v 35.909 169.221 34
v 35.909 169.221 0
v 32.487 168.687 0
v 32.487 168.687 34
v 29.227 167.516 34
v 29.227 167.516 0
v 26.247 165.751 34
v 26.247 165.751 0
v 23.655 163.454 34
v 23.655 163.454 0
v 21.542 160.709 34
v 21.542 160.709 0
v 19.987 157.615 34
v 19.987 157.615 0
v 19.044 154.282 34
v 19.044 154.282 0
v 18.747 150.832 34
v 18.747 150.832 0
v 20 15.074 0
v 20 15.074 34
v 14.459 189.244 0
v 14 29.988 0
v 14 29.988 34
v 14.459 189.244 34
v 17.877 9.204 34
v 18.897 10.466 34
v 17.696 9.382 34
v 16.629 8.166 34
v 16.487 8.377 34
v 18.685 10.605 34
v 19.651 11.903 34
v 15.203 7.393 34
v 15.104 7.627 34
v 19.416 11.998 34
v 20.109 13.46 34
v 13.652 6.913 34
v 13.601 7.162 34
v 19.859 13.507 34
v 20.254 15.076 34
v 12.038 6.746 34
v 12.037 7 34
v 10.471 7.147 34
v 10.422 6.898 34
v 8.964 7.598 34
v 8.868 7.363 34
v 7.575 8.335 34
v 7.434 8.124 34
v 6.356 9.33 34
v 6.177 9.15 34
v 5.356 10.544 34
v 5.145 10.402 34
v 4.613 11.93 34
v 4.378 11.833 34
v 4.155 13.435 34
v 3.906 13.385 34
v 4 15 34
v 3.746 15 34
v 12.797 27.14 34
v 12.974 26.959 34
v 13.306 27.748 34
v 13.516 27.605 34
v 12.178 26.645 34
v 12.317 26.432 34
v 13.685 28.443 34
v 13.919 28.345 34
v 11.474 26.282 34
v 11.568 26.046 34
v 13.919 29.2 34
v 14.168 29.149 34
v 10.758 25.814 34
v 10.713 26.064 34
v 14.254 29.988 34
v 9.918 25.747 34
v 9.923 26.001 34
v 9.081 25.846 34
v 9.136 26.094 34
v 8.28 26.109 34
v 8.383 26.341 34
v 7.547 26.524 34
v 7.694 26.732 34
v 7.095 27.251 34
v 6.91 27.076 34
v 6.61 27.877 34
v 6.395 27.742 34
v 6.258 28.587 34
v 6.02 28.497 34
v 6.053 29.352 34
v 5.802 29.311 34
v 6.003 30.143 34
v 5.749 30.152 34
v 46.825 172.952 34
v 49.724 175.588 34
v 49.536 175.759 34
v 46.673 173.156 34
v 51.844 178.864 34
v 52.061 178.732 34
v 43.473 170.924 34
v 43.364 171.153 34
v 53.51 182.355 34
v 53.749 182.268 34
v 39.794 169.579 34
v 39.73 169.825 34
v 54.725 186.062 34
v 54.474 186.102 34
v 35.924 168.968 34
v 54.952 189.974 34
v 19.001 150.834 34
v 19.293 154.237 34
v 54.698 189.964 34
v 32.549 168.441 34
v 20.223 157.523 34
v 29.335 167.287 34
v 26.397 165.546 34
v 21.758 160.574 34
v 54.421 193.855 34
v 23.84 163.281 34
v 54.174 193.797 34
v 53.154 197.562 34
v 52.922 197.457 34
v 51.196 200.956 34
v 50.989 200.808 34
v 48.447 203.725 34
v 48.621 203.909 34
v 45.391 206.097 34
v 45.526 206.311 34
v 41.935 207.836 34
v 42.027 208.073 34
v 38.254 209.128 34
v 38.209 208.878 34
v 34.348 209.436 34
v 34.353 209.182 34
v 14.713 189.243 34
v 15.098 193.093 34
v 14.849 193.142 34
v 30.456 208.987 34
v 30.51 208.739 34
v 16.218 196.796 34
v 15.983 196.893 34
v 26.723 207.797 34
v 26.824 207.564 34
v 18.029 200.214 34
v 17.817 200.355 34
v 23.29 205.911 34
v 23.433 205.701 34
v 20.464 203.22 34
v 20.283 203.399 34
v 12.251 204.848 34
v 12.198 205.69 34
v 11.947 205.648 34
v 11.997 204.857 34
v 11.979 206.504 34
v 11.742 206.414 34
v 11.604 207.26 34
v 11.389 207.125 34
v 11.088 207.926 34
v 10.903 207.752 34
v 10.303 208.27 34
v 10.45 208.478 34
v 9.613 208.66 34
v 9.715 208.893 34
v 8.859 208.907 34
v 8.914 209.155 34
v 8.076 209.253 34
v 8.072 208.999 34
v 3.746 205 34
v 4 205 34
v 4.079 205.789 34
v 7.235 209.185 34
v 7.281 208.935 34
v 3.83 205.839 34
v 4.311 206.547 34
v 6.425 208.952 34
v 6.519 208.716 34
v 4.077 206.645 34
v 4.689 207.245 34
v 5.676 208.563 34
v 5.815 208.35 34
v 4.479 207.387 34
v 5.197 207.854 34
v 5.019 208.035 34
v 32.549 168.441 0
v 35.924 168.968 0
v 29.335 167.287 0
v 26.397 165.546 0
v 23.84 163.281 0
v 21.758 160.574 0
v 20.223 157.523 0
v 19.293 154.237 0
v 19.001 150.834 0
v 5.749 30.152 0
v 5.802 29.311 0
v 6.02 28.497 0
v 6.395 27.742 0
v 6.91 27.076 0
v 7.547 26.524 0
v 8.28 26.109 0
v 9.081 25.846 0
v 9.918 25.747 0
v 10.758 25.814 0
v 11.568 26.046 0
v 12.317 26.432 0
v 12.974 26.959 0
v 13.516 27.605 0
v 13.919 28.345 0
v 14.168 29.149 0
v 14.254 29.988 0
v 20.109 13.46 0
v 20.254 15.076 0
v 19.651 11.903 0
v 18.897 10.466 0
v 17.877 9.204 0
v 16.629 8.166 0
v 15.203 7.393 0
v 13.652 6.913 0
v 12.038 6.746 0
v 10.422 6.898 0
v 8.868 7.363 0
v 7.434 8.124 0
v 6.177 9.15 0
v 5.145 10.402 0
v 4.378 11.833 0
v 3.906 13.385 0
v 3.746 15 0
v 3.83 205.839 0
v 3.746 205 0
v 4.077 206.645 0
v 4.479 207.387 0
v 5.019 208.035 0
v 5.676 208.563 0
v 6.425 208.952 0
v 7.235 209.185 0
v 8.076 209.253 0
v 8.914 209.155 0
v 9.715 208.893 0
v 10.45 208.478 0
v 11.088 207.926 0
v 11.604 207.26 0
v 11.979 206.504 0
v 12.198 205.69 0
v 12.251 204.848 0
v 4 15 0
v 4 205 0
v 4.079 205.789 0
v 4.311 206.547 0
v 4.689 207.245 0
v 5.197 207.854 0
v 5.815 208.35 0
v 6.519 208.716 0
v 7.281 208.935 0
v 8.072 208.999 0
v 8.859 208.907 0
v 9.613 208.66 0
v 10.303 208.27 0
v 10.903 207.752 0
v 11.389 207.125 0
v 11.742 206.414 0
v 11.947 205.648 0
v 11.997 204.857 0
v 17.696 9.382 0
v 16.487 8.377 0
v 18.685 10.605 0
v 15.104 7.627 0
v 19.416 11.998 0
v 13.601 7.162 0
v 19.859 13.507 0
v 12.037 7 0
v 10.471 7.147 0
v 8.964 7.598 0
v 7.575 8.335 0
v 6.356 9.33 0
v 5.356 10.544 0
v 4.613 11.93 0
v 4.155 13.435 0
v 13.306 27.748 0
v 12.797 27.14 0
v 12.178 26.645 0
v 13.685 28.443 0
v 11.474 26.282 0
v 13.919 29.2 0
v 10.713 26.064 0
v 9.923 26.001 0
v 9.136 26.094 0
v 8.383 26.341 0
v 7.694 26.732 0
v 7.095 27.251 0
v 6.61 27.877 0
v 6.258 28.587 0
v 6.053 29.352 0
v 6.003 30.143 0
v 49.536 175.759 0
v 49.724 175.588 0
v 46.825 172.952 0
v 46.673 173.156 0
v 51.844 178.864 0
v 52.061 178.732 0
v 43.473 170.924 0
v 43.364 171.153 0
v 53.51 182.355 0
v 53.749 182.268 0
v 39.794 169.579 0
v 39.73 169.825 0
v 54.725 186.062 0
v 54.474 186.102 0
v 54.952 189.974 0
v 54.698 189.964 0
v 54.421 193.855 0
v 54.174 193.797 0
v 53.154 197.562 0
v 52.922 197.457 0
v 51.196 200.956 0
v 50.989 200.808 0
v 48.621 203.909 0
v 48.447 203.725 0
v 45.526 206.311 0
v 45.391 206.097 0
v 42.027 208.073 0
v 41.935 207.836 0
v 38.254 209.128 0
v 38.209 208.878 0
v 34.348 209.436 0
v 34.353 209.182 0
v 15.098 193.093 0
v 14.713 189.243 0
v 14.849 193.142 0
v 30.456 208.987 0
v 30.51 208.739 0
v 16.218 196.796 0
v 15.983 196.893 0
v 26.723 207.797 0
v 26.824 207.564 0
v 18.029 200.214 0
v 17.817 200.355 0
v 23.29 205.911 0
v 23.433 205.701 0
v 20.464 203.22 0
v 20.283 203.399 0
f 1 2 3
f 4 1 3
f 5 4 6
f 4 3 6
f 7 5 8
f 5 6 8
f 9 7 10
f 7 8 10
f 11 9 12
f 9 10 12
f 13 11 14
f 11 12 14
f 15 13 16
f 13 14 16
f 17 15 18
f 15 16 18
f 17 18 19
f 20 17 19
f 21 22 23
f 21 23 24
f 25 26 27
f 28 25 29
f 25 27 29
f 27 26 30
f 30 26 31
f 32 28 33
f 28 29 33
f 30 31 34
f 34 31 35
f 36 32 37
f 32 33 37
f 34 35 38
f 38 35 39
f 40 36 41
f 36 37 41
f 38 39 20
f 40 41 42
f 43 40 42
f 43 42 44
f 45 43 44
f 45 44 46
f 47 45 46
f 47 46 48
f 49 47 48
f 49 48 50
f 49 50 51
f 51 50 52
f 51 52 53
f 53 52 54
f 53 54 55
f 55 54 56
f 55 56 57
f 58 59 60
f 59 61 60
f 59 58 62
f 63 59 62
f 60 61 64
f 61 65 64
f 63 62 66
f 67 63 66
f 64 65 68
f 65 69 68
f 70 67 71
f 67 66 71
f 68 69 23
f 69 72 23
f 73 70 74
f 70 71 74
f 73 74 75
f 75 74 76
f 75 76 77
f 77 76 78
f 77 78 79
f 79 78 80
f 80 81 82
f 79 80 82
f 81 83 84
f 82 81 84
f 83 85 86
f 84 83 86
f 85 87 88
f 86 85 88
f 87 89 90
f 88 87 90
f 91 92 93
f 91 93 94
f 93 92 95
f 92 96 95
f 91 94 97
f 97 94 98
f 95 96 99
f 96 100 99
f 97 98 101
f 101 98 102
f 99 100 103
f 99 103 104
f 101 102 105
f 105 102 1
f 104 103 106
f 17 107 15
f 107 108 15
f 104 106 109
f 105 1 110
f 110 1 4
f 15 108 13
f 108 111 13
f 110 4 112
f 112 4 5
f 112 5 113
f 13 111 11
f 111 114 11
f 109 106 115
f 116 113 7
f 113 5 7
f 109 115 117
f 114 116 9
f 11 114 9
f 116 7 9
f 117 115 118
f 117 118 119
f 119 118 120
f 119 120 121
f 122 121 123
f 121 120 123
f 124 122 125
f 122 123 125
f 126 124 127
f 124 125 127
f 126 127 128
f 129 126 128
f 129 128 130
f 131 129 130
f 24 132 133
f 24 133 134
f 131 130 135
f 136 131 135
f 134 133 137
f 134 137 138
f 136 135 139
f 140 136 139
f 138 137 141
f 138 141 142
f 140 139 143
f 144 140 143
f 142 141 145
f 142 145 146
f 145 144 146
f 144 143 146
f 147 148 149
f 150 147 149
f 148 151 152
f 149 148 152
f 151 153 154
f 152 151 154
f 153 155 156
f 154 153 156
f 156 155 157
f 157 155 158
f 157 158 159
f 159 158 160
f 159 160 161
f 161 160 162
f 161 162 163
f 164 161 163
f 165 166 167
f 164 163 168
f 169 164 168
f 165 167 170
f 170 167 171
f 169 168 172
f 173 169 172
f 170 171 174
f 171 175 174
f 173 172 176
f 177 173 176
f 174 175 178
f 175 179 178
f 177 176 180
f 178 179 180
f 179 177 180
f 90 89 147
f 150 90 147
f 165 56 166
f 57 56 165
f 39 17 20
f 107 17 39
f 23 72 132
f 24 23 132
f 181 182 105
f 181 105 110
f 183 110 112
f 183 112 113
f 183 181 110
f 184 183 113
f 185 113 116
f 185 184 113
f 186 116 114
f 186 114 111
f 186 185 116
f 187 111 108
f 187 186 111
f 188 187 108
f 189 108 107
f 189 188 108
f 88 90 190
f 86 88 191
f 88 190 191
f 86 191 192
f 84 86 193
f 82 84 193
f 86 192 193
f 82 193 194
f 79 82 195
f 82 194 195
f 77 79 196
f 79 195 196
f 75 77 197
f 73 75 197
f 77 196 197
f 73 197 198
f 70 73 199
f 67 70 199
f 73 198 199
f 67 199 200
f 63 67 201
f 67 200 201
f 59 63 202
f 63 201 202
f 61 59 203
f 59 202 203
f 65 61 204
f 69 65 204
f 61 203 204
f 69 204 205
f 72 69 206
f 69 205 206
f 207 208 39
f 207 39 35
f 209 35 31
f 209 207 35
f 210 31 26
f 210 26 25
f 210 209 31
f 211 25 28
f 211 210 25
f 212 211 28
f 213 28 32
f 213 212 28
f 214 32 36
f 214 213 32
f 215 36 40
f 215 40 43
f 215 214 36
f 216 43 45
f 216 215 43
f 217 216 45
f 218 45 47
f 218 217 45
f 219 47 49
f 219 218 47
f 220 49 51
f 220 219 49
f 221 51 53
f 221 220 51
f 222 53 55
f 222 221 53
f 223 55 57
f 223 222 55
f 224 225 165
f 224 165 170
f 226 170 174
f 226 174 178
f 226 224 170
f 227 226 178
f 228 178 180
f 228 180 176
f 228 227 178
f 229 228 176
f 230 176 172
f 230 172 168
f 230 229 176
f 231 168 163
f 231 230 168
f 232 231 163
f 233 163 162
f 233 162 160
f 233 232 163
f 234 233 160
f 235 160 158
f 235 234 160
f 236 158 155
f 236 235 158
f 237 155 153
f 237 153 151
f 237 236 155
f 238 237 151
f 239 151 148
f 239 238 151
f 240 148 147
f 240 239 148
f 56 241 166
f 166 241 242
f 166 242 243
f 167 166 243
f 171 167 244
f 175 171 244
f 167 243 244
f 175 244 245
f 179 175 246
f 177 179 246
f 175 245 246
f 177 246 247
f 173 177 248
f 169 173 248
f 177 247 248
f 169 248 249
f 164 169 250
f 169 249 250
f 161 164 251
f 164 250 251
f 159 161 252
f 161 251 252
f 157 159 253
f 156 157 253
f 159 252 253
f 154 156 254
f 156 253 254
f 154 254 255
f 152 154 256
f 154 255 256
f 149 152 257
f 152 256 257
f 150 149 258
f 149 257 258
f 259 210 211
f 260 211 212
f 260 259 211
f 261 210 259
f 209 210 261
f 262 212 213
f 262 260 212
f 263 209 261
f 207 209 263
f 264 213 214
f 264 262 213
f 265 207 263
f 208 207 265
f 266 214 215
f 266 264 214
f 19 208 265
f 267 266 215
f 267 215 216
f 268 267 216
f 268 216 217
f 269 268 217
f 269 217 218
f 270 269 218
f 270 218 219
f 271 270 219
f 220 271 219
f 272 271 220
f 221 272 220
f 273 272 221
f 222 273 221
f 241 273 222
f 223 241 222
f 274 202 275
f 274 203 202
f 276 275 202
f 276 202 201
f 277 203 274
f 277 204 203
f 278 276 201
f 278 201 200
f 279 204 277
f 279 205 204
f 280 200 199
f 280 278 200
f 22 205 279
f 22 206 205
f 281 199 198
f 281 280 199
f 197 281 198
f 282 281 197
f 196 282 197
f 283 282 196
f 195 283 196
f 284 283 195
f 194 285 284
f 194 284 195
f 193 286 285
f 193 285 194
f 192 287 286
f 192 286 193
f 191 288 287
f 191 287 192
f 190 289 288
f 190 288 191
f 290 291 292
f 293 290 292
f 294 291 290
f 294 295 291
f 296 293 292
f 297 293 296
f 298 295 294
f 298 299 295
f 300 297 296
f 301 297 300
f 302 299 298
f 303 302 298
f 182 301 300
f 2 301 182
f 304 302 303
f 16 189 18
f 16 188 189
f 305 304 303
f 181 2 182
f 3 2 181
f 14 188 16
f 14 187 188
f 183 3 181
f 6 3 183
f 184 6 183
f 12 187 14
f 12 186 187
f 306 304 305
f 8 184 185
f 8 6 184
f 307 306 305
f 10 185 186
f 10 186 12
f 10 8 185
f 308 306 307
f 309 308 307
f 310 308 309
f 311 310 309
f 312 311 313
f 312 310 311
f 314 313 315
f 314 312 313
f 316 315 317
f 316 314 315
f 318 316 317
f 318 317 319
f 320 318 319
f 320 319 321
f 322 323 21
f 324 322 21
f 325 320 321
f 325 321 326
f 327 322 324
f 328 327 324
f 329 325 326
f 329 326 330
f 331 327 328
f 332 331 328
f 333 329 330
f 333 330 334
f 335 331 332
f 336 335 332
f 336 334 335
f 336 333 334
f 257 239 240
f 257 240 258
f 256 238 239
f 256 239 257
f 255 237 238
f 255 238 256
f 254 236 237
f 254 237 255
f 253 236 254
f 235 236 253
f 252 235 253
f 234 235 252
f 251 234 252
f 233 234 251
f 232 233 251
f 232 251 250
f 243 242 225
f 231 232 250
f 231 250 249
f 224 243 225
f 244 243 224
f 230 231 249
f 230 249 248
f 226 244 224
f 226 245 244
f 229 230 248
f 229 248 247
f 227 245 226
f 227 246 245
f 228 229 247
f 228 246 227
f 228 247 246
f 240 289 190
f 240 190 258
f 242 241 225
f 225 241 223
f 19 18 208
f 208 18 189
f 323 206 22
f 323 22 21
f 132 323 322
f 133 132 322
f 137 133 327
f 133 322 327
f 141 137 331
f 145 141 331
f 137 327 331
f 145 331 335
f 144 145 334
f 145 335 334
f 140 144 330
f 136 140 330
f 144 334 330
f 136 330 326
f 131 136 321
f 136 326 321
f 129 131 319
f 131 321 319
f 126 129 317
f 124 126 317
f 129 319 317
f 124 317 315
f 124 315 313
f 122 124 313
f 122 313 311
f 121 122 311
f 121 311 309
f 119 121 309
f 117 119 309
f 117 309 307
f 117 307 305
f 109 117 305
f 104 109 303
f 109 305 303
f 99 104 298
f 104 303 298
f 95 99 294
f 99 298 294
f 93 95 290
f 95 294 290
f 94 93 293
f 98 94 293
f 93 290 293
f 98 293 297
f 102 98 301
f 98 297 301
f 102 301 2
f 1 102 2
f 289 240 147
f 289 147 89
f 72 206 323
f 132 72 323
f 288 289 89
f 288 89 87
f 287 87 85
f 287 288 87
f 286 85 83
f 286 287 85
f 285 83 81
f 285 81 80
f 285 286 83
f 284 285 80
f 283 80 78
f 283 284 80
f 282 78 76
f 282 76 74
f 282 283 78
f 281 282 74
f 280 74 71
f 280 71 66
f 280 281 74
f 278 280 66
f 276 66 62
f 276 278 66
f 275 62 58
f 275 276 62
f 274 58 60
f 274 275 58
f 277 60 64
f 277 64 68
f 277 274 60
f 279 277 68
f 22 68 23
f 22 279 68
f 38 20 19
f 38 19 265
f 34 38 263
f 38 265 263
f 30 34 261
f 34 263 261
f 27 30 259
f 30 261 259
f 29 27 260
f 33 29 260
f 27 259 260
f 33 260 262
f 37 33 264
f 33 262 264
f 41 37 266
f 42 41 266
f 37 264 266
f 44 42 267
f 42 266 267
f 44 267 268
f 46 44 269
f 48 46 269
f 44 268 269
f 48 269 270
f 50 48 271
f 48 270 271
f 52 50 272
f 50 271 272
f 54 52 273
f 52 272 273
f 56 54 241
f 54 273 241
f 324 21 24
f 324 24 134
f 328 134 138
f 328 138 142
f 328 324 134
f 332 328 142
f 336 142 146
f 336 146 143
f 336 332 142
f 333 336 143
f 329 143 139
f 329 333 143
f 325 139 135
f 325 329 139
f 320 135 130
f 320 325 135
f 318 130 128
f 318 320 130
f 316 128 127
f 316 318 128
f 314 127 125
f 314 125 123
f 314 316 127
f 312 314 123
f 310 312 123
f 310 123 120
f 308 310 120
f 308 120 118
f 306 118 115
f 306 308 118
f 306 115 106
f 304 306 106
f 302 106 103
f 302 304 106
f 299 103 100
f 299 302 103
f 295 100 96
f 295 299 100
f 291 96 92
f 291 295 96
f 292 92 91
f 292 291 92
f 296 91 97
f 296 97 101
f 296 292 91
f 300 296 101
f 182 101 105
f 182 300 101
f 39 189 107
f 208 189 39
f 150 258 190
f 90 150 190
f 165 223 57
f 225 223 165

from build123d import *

# Parameters (mm, degrees)
BOSS_EXTRUDE1_DEPTH = 34


with BuildPart() as part:
    # Sketch1 → Boss-Extrude1 (new body)
    with BuildSketch(Plane.XY):
        with BuildLine():
            Line((3.746, 15), (3.746, 43))
            Line((3.746, 43), (3.746, 173))
            Line((3.746, 173), (3.746, 205))
            ThreePointArc((3.746, 205), (8.076040586, 209.25332033), (12.251281537, 204.847943126))
            Line((12.251281537, 204.847943126), (6.002556148, 30.142977785))
            ThreePointArc((6.002556148, 30.142977785), (9.922734835, 26.000746308), (13.999983378, 29.988468323))
            Line((13.999983378, 29.988468323), (14.459106014, 189.24396707))
            ThreePointArc((14.459106014, 189.24396707), (48.621297679, 203.909175827), (35.923887521, 168.967804038))
            ThreePointArc((35.923887521, 168.967804038), (23.840329441, 163.281004469), (19.000766489, 150.833888513))
            Line((19.000766489, 150.833888513), (20.253648522, 15.076171345))
            ThreePointArc((20.253648522, 15.076171345), (12.038086078, 6.74608787), (3.746, 15))
        make_face()
        with BuildLine():
            Line((4, 43), (4, 173))
            Line((4, 173), (4, 205))
            ThreePointArc((4, 205), (8.071500316, 208.999360912), (11.997443852, 204.857022215))
            Line((11.997443852, 204.857022215), (5.748718463, 30.152056874))
            ThreePointArc((5.748718463, 30.152056874), (9.917828497, 25.746793698), (14.253982322, 29.987736062))
            Line((14.253982322, 29.987736062), (14.713104958, 189.243234808))
            ThreePointArc((14.713104958, 189.243234808), (48.446877709, 203.724531103), (35.908702378, 169.221349717))
            ThreePointArc((35.908702378, 169.221349717), (23.654631868, 163.454303088), (18.746777305, 150.831544495))
            Line((18.746777305, 150.831544495), (19.999659338, 15.073827328))
            ThreePointArc((19.999659338, 15.073827328), (12.036914057, 7.000085166), (4, 15))
            Line((4, 15), (4, 43))
        make_face(mode=Mode.SUBTRACT)
    extrude(amount=BOSS_EXTRUDE1_DEPTH)


solid = part.part
